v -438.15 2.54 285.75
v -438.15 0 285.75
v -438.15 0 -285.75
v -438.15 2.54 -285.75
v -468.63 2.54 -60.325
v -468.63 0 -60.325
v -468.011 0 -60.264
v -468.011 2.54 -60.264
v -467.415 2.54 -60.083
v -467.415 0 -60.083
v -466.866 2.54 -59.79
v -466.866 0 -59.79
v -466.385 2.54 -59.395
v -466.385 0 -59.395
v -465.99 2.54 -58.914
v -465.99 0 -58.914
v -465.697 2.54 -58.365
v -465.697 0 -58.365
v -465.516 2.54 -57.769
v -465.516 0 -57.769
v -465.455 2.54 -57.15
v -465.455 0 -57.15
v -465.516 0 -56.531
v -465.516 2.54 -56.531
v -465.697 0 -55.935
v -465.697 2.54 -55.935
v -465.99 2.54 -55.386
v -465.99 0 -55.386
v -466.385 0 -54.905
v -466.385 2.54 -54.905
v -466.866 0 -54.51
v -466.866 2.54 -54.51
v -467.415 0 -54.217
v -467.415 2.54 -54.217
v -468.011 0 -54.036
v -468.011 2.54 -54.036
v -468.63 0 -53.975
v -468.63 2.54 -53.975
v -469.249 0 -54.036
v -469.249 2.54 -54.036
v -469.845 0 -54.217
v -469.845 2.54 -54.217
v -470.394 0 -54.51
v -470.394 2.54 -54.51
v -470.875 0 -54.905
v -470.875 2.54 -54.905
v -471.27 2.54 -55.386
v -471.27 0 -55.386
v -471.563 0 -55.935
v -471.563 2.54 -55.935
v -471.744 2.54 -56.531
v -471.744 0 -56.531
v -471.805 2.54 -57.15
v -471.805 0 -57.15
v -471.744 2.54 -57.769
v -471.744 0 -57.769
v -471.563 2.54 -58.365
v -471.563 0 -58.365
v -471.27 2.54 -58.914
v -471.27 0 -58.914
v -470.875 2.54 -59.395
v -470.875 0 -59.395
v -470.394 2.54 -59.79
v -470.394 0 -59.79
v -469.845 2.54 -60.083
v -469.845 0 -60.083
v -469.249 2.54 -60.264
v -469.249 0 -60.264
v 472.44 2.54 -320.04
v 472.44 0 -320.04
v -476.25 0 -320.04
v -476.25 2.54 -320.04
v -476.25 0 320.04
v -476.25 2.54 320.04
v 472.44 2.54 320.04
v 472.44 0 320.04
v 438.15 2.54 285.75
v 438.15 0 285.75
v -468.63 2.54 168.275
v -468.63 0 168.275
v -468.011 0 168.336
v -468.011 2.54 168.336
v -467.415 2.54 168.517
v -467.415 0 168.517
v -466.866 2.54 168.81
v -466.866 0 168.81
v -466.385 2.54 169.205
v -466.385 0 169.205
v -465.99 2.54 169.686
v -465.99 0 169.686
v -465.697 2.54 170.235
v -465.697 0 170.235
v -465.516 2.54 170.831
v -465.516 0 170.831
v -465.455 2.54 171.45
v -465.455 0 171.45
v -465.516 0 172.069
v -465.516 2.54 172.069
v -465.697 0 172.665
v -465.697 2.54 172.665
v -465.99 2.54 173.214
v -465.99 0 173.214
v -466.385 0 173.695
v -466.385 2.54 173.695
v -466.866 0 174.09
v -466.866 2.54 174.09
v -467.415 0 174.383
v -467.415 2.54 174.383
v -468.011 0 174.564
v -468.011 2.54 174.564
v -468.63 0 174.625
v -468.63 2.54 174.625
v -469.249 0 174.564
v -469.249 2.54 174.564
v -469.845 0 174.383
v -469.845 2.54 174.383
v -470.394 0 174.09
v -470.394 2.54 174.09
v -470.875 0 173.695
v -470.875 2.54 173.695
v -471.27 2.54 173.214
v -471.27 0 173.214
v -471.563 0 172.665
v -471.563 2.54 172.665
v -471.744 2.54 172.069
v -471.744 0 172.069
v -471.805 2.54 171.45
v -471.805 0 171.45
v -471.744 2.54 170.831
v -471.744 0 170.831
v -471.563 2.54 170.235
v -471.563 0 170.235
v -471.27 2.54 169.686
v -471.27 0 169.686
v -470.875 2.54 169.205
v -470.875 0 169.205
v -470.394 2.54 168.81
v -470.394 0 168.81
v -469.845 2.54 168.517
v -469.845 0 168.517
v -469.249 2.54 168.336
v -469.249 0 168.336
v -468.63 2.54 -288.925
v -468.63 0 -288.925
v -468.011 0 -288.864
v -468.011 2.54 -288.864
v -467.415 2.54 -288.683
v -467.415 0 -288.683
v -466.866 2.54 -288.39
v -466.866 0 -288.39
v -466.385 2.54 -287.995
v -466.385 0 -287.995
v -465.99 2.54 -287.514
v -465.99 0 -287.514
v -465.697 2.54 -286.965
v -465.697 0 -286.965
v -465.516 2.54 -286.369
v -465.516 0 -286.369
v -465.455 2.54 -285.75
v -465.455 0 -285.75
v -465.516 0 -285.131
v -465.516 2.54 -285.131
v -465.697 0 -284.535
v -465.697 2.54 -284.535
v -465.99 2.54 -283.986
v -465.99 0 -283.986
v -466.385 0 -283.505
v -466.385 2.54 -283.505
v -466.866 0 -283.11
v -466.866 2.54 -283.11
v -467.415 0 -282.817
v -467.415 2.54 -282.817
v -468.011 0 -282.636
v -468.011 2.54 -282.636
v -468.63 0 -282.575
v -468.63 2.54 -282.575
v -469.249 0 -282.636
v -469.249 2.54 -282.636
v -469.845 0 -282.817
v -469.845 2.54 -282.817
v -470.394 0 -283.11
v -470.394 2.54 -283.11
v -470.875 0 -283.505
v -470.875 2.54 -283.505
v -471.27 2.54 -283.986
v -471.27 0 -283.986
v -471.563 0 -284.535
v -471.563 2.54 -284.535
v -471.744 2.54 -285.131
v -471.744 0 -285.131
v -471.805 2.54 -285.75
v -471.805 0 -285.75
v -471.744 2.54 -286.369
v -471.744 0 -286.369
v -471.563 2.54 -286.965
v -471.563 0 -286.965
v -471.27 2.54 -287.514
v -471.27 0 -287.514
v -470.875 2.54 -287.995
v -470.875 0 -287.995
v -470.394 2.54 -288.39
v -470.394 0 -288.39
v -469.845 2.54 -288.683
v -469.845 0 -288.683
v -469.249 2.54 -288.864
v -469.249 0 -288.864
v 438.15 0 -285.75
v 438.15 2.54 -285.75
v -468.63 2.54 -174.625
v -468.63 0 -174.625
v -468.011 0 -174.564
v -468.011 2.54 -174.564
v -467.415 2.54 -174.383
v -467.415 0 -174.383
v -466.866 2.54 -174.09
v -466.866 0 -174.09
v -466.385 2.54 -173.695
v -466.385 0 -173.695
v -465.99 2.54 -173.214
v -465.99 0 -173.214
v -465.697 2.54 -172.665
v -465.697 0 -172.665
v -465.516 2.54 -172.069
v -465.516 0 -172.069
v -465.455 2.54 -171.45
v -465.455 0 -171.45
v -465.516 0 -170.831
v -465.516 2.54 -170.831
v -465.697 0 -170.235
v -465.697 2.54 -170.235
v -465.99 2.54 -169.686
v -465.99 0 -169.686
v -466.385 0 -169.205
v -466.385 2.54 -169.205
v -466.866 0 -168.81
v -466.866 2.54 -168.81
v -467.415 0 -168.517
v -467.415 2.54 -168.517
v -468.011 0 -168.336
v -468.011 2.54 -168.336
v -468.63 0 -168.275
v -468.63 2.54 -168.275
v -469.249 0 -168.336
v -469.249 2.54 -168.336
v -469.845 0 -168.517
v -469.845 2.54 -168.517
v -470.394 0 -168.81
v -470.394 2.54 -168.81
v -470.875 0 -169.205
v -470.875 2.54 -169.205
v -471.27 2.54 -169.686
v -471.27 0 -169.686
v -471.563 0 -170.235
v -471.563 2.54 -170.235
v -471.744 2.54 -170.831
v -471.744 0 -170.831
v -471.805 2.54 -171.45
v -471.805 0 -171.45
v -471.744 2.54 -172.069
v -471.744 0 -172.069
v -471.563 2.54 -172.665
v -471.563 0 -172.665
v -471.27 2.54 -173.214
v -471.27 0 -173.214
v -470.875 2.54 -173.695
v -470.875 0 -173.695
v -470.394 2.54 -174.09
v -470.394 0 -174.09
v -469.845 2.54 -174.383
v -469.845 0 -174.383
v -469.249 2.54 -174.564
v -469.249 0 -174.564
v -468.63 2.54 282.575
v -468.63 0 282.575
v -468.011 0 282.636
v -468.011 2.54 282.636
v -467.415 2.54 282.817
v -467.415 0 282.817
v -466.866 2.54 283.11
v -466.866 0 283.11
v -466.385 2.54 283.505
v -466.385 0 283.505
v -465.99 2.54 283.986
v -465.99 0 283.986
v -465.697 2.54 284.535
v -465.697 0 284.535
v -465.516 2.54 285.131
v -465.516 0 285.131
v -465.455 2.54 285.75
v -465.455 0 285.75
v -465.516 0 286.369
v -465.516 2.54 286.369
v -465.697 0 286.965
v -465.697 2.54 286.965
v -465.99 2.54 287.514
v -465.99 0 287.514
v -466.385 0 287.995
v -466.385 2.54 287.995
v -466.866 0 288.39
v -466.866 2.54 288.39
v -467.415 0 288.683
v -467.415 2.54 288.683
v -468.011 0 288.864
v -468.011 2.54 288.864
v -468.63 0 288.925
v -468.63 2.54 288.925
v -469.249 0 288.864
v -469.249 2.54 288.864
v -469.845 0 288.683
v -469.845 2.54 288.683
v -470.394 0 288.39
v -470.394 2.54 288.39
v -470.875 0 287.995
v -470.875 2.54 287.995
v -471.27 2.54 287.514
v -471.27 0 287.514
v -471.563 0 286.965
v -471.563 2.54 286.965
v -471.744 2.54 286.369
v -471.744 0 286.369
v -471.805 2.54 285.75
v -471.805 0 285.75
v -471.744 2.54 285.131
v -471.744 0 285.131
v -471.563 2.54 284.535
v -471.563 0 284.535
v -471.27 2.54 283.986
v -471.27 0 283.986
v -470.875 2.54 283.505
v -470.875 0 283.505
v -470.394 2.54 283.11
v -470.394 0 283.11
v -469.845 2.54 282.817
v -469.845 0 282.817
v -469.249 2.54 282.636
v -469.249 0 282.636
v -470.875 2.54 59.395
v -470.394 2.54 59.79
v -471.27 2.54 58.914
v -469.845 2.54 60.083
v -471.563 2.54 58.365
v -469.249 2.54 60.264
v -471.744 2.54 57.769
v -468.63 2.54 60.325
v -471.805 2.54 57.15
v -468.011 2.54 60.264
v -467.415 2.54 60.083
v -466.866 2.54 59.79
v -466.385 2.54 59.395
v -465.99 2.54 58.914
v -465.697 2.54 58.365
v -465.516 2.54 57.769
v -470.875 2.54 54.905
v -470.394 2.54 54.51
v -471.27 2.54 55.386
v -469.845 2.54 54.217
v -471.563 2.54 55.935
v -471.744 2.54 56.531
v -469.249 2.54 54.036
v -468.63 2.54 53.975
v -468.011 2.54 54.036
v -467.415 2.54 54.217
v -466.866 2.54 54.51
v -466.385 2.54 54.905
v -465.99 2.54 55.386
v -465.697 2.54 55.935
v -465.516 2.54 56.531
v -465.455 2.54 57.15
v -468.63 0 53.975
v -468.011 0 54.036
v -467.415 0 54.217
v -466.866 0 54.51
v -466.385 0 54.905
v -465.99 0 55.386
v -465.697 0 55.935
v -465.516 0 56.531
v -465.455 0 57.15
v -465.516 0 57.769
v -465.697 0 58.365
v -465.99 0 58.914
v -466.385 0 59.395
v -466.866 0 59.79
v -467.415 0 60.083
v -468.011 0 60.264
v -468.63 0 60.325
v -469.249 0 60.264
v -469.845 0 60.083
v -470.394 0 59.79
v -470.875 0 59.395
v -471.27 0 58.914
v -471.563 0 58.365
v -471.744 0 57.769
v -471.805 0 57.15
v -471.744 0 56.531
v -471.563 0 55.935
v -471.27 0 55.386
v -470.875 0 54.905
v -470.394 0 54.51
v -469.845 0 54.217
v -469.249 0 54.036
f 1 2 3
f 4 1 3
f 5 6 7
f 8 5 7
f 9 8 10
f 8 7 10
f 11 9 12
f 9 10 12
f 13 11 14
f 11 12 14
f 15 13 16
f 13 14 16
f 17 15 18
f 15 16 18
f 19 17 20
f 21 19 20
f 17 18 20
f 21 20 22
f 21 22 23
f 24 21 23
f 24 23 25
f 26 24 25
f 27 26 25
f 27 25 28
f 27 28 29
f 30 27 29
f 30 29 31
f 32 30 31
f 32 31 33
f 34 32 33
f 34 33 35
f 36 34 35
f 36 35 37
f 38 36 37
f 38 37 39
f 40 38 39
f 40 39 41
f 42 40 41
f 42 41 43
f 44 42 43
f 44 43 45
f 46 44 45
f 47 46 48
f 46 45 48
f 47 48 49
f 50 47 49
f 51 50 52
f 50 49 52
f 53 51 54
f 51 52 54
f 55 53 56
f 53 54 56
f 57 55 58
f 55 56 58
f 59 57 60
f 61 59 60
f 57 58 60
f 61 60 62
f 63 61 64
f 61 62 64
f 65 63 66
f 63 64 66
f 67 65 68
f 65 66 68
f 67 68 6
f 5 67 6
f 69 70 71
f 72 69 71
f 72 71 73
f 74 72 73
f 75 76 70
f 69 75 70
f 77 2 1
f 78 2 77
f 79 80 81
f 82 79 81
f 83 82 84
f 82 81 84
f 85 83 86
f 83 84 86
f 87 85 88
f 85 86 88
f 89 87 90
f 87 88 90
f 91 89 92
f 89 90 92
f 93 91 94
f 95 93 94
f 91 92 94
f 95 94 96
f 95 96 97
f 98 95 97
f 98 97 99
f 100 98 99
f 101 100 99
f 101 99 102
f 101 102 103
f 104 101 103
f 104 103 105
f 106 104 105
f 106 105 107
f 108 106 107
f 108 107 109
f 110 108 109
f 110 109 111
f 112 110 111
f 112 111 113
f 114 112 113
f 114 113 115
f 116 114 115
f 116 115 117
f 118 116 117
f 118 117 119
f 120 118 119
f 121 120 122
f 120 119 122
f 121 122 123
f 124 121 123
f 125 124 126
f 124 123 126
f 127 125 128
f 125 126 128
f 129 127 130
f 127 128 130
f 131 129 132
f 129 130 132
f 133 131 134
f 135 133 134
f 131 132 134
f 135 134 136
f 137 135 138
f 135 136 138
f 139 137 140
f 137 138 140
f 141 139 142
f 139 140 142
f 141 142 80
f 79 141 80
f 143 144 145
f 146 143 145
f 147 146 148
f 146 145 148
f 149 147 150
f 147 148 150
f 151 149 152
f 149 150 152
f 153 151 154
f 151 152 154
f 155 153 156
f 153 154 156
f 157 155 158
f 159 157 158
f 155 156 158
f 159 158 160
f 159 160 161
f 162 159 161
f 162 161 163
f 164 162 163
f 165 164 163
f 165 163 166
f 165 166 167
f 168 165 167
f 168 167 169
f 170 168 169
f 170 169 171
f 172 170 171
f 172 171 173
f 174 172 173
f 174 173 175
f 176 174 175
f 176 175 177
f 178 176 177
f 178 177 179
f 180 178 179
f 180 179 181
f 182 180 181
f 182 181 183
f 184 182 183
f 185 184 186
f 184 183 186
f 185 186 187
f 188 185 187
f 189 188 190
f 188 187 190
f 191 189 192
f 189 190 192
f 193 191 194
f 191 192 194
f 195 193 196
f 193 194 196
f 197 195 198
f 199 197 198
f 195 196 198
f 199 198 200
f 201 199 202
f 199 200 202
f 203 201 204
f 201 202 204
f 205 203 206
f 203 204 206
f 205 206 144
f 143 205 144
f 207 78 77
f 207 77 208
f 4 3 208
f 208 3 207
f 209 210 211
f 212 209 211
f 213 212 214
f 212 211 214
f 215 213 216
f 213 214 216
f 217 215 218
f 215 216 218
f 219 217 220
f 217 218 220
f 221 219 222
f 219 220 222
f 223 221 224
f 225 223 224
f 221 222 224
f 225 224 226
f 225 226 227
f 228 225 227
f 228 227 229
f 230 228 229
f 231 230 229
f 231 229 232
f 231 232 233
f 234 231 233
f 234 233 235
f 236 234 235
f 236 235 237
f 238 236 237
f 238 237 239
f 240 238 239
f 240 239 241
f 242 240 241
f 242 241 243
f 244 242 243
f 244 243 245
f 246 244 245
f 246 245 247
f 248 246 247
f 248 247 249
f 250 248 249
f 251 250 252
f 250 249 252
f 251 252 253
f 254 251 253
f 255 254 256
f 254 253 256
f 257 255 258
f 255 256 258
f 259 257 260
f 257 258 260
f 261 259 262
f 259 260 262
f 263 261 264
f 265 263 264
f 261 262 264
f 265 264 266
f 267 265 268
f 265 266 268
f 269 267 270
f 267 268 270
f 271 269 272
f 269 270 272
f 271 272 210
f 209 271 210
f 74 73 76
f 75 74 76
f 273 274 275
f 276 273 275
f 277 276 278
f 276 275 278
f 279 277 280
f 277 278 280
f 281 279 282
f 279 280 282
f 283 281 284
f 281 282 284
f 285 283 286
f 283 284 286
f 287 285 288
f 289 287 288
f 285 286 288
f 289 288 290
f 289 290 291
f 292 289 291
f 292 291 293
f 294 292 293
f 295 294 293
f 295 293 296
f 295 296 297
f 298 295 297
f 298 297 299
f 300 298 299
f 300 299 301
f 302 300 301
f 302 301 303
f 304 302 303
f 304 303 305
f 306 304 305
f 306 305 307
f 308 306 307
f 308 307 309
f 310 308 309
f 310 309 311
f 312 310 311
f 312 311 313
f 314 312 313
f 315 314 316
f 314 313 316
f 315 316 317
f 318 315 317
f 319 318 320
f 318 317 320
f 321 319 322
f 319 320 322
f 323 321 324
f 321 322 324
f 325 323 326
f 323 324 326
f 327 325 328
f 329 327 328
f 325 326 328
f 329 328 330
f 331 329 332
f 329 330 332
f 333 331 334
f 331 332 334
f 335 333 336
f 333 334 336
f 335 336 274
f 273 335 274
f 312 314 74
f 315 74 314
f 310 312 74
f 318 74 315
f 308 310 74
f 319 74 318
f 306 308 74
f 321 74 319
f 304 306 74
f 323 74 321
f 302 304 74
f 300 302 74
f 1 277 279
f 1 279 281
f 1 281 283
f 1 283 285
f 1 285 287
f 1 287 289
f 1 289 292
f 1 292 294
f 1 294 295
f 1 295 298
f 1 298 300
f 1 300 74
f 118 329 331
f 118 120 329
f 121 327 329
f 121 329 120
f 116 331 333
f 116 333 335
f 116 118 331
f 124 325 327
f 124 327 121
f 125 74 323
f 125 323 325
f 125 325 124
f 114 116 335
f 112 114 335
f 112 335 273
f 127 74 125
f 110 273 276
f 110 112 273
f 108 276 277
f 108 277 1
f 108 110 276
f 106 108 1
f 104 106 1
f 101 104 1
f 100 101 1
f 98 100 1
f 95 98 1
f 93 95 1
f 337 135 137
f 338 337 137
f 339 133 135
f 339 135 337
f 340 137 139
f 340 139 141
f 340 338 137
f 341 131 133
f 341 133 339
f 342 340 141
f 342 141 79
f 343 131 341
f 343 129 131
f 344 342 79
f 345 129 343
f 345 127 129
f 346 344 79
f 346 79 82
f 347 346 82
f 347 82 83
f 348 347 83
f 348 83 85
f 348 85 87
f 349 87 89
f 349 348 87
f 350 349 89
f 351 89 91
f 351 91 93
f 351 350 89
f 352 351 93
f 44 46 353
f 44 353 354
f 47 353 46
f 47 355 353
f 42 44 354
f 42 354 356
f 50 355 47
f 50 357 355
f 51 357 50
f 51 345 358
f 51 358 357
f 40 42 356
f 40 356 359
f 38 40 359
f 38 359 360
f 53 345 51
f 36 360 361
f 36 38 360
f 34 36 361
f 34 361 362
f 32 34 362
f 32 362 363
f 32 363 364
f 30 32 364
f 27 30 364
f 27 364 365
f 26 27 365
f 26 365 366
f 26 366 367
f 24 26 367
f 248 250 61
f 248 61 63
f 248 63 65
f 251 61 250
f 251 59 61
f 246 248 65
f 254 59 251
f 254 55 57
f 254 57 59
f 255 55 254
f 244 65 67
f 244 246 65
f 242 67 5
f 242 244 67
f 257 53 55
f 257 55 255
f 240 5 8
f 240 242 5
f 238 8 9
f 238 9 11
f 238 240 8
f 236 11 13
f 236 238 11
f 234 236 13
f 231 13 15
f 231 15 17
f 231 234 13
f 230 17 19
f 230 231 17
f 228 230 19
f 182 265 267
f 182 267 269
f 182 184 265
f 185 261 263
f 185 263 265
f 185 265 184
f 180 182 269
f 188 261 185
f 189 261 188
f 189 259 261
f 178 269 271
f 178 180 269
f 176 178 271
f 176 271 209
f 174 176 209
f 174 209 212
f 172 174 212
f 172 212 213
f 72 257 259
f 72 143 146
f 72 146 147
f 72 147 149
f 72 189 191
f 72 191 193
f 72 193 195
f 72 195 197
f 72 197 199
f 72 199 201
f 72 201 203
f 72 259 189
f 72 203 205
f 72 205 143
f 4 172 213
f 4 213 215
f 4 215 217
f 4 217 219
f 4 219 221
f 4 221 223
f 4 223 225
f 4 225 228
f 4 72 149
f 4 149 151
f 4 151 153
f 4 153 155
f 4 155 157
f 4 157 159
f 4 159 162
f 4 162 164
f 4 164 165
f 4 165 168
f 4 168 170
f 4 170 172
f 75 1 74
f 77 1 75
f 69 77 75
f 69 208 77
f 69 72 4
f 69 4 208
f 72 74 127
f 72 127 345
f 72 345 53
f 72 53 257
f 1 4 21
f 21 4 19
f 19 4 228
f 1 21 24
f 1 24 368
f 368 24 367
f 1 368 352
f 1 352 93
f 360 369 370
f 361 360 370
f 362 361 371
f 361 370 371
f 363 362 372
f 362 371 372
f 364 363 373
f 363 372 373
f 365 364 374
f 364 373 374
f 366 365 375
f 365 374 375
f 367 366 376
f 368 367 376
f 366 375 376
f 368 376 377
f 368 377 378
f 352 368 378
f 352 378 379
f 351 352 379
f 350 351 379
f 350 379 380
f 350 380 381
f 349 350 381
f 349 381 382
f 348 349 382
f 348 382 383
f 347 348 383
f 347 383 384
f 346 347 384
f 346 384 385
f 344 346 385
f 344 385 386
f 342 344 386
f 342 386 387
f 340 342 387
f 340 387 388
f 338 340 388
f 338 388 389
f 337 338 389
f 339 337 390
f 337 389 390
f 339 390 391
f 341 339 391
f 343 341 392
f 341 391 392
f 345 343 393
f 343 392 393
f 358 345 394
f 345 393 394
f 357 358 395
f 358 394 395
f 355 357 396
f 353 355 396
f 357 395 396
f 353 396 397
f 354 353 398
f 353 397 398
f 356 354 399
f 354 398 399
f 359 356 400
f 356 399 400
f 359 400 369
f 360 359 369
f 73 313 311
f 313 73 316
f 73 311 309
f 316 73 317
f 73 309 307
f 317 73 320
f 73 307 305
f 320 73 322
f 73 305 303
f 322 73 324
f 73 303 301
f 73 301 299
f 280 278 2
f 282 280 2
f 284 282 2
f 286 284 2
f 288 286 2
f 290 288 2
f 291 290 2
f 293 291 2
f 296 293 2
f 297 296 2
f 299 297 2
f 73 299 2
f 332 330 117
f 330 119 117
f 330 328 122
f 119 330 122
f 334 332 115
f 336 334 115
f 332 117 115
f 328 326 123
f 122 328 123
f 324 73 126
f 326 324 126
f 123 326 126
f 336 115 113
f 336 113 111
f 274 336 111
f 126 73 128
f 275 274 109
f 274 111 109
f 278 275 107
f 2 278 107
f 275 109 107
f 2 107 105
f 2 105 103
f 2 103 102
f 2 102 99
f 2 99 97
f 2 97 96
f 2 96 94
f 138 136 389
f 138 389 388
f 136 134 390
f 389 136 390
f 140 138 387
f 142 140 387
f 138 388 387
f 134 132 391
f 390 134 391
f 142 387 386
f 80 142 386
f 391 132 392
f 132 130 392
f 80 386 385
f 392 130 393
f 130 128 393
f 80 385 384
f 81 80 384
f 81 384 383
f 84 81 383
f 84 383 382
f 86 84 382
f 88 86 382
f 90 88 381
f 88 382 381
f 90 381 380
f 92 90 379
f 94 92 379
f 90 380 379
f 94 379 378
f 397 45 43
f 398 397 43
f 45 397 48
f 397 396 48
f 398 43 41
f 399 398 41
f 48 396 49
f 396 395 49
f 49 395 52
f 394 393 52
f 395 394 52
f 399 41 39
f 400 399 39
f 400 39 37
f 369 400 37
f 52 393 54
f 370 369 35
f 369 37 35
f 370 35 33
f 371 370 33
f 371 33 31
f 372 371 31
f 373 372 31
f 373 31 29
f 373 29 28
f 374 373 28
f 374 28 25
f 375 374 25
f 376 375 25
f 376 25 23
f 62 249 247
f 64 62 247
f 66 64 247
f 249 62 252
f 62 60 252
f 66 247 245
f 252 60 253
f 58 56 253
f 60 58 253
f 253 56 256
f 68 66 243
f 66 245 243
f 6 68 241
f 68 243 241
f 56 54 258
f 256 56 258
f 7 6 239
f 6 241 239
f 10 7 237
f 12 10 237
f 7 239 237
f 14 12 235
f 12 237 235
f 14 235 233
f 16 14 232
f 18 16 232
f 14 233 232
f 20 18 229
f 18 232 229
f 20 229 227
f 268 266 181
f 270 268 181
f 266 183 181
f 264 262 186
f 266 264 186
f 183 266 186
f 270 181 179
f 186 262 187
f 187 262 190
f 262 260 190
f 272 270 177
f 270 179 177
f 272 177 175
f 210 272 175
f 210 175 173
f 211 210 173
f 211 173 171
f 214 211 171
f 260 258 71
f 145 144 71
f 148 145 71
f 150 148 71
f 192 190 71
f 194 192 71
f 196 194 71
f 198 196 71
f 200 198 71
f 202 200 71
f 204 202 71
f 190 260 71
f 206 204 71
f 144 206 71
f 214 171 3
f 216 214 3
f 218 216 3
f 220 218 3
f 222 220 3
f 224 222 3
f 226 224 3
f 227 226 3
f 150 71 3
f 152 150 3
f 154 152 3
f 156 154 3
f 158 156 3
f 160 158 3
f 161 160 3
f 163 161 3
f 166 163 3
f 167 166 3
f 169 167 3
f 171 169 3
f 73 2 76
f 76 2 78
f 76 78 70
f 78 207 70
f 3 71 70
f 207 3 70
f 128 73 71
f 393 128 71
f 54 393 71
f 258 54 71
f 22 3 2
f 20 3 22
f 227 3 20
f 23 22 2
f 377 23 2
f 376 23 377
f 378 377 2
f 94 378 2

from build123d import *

# Parameters (mm, degrees)
SKETCH1_W                   = 876.3
SKETCH1_H                   = 571.5
BOSS_EXTRUDE1_DEPTH         = 2.54
F_1_4_0_25_DIAMETER_HOLE1_D = 6.35
LPATTERN1_COUNT             = 6
LPATTERN1_PITCH             = 114.3


with BuildPart() as part:
    # Sketch1 → Boss-Extrude1 (new body)
    with BuildSketch(Plane(origin=(0, 0, 0), x_dir=(1, 0, 0), z_dir=(0, 1, 0))):
        Polygon((-472.44, -320.04), (472.44, -320.04), (472.44, 320.04), (-472.44, 320.04), (-476.25, 320.04), (-476.25, -320.04), align=None)
        Rectangle(SKETCH1_W, SKETCH1_H, mode=Mode.SUBTRACT)
    extrude(amount=BOSS_EXTRUDE1_DEPTH)

    # 1/4 (0.25) Diameter Hole1 (through all)
    with Locations(Plane(origin=(-468.63, 2.54, -285.75), x_dir=(0, 0, 1), z_dir=(0, 1, 0))):
        with Locations((0, 0)):
            f_1_4_0_25_diameter_hole1 = Hole(F_1_4_0_25_DIAMETER_HOLE1_D / 2)

    # LPattern1: 1/4 (0.25) Diameter Hole1 ×6
    with Locations(*[(0, 0, i * LPATTERN1_PITCH) for i in range(1, LPATTERN1_COUNT)]):
        add(f_1_4_0_25_diameter_hole1, mode=Mode.SUBTRACT)


solid = part.part
